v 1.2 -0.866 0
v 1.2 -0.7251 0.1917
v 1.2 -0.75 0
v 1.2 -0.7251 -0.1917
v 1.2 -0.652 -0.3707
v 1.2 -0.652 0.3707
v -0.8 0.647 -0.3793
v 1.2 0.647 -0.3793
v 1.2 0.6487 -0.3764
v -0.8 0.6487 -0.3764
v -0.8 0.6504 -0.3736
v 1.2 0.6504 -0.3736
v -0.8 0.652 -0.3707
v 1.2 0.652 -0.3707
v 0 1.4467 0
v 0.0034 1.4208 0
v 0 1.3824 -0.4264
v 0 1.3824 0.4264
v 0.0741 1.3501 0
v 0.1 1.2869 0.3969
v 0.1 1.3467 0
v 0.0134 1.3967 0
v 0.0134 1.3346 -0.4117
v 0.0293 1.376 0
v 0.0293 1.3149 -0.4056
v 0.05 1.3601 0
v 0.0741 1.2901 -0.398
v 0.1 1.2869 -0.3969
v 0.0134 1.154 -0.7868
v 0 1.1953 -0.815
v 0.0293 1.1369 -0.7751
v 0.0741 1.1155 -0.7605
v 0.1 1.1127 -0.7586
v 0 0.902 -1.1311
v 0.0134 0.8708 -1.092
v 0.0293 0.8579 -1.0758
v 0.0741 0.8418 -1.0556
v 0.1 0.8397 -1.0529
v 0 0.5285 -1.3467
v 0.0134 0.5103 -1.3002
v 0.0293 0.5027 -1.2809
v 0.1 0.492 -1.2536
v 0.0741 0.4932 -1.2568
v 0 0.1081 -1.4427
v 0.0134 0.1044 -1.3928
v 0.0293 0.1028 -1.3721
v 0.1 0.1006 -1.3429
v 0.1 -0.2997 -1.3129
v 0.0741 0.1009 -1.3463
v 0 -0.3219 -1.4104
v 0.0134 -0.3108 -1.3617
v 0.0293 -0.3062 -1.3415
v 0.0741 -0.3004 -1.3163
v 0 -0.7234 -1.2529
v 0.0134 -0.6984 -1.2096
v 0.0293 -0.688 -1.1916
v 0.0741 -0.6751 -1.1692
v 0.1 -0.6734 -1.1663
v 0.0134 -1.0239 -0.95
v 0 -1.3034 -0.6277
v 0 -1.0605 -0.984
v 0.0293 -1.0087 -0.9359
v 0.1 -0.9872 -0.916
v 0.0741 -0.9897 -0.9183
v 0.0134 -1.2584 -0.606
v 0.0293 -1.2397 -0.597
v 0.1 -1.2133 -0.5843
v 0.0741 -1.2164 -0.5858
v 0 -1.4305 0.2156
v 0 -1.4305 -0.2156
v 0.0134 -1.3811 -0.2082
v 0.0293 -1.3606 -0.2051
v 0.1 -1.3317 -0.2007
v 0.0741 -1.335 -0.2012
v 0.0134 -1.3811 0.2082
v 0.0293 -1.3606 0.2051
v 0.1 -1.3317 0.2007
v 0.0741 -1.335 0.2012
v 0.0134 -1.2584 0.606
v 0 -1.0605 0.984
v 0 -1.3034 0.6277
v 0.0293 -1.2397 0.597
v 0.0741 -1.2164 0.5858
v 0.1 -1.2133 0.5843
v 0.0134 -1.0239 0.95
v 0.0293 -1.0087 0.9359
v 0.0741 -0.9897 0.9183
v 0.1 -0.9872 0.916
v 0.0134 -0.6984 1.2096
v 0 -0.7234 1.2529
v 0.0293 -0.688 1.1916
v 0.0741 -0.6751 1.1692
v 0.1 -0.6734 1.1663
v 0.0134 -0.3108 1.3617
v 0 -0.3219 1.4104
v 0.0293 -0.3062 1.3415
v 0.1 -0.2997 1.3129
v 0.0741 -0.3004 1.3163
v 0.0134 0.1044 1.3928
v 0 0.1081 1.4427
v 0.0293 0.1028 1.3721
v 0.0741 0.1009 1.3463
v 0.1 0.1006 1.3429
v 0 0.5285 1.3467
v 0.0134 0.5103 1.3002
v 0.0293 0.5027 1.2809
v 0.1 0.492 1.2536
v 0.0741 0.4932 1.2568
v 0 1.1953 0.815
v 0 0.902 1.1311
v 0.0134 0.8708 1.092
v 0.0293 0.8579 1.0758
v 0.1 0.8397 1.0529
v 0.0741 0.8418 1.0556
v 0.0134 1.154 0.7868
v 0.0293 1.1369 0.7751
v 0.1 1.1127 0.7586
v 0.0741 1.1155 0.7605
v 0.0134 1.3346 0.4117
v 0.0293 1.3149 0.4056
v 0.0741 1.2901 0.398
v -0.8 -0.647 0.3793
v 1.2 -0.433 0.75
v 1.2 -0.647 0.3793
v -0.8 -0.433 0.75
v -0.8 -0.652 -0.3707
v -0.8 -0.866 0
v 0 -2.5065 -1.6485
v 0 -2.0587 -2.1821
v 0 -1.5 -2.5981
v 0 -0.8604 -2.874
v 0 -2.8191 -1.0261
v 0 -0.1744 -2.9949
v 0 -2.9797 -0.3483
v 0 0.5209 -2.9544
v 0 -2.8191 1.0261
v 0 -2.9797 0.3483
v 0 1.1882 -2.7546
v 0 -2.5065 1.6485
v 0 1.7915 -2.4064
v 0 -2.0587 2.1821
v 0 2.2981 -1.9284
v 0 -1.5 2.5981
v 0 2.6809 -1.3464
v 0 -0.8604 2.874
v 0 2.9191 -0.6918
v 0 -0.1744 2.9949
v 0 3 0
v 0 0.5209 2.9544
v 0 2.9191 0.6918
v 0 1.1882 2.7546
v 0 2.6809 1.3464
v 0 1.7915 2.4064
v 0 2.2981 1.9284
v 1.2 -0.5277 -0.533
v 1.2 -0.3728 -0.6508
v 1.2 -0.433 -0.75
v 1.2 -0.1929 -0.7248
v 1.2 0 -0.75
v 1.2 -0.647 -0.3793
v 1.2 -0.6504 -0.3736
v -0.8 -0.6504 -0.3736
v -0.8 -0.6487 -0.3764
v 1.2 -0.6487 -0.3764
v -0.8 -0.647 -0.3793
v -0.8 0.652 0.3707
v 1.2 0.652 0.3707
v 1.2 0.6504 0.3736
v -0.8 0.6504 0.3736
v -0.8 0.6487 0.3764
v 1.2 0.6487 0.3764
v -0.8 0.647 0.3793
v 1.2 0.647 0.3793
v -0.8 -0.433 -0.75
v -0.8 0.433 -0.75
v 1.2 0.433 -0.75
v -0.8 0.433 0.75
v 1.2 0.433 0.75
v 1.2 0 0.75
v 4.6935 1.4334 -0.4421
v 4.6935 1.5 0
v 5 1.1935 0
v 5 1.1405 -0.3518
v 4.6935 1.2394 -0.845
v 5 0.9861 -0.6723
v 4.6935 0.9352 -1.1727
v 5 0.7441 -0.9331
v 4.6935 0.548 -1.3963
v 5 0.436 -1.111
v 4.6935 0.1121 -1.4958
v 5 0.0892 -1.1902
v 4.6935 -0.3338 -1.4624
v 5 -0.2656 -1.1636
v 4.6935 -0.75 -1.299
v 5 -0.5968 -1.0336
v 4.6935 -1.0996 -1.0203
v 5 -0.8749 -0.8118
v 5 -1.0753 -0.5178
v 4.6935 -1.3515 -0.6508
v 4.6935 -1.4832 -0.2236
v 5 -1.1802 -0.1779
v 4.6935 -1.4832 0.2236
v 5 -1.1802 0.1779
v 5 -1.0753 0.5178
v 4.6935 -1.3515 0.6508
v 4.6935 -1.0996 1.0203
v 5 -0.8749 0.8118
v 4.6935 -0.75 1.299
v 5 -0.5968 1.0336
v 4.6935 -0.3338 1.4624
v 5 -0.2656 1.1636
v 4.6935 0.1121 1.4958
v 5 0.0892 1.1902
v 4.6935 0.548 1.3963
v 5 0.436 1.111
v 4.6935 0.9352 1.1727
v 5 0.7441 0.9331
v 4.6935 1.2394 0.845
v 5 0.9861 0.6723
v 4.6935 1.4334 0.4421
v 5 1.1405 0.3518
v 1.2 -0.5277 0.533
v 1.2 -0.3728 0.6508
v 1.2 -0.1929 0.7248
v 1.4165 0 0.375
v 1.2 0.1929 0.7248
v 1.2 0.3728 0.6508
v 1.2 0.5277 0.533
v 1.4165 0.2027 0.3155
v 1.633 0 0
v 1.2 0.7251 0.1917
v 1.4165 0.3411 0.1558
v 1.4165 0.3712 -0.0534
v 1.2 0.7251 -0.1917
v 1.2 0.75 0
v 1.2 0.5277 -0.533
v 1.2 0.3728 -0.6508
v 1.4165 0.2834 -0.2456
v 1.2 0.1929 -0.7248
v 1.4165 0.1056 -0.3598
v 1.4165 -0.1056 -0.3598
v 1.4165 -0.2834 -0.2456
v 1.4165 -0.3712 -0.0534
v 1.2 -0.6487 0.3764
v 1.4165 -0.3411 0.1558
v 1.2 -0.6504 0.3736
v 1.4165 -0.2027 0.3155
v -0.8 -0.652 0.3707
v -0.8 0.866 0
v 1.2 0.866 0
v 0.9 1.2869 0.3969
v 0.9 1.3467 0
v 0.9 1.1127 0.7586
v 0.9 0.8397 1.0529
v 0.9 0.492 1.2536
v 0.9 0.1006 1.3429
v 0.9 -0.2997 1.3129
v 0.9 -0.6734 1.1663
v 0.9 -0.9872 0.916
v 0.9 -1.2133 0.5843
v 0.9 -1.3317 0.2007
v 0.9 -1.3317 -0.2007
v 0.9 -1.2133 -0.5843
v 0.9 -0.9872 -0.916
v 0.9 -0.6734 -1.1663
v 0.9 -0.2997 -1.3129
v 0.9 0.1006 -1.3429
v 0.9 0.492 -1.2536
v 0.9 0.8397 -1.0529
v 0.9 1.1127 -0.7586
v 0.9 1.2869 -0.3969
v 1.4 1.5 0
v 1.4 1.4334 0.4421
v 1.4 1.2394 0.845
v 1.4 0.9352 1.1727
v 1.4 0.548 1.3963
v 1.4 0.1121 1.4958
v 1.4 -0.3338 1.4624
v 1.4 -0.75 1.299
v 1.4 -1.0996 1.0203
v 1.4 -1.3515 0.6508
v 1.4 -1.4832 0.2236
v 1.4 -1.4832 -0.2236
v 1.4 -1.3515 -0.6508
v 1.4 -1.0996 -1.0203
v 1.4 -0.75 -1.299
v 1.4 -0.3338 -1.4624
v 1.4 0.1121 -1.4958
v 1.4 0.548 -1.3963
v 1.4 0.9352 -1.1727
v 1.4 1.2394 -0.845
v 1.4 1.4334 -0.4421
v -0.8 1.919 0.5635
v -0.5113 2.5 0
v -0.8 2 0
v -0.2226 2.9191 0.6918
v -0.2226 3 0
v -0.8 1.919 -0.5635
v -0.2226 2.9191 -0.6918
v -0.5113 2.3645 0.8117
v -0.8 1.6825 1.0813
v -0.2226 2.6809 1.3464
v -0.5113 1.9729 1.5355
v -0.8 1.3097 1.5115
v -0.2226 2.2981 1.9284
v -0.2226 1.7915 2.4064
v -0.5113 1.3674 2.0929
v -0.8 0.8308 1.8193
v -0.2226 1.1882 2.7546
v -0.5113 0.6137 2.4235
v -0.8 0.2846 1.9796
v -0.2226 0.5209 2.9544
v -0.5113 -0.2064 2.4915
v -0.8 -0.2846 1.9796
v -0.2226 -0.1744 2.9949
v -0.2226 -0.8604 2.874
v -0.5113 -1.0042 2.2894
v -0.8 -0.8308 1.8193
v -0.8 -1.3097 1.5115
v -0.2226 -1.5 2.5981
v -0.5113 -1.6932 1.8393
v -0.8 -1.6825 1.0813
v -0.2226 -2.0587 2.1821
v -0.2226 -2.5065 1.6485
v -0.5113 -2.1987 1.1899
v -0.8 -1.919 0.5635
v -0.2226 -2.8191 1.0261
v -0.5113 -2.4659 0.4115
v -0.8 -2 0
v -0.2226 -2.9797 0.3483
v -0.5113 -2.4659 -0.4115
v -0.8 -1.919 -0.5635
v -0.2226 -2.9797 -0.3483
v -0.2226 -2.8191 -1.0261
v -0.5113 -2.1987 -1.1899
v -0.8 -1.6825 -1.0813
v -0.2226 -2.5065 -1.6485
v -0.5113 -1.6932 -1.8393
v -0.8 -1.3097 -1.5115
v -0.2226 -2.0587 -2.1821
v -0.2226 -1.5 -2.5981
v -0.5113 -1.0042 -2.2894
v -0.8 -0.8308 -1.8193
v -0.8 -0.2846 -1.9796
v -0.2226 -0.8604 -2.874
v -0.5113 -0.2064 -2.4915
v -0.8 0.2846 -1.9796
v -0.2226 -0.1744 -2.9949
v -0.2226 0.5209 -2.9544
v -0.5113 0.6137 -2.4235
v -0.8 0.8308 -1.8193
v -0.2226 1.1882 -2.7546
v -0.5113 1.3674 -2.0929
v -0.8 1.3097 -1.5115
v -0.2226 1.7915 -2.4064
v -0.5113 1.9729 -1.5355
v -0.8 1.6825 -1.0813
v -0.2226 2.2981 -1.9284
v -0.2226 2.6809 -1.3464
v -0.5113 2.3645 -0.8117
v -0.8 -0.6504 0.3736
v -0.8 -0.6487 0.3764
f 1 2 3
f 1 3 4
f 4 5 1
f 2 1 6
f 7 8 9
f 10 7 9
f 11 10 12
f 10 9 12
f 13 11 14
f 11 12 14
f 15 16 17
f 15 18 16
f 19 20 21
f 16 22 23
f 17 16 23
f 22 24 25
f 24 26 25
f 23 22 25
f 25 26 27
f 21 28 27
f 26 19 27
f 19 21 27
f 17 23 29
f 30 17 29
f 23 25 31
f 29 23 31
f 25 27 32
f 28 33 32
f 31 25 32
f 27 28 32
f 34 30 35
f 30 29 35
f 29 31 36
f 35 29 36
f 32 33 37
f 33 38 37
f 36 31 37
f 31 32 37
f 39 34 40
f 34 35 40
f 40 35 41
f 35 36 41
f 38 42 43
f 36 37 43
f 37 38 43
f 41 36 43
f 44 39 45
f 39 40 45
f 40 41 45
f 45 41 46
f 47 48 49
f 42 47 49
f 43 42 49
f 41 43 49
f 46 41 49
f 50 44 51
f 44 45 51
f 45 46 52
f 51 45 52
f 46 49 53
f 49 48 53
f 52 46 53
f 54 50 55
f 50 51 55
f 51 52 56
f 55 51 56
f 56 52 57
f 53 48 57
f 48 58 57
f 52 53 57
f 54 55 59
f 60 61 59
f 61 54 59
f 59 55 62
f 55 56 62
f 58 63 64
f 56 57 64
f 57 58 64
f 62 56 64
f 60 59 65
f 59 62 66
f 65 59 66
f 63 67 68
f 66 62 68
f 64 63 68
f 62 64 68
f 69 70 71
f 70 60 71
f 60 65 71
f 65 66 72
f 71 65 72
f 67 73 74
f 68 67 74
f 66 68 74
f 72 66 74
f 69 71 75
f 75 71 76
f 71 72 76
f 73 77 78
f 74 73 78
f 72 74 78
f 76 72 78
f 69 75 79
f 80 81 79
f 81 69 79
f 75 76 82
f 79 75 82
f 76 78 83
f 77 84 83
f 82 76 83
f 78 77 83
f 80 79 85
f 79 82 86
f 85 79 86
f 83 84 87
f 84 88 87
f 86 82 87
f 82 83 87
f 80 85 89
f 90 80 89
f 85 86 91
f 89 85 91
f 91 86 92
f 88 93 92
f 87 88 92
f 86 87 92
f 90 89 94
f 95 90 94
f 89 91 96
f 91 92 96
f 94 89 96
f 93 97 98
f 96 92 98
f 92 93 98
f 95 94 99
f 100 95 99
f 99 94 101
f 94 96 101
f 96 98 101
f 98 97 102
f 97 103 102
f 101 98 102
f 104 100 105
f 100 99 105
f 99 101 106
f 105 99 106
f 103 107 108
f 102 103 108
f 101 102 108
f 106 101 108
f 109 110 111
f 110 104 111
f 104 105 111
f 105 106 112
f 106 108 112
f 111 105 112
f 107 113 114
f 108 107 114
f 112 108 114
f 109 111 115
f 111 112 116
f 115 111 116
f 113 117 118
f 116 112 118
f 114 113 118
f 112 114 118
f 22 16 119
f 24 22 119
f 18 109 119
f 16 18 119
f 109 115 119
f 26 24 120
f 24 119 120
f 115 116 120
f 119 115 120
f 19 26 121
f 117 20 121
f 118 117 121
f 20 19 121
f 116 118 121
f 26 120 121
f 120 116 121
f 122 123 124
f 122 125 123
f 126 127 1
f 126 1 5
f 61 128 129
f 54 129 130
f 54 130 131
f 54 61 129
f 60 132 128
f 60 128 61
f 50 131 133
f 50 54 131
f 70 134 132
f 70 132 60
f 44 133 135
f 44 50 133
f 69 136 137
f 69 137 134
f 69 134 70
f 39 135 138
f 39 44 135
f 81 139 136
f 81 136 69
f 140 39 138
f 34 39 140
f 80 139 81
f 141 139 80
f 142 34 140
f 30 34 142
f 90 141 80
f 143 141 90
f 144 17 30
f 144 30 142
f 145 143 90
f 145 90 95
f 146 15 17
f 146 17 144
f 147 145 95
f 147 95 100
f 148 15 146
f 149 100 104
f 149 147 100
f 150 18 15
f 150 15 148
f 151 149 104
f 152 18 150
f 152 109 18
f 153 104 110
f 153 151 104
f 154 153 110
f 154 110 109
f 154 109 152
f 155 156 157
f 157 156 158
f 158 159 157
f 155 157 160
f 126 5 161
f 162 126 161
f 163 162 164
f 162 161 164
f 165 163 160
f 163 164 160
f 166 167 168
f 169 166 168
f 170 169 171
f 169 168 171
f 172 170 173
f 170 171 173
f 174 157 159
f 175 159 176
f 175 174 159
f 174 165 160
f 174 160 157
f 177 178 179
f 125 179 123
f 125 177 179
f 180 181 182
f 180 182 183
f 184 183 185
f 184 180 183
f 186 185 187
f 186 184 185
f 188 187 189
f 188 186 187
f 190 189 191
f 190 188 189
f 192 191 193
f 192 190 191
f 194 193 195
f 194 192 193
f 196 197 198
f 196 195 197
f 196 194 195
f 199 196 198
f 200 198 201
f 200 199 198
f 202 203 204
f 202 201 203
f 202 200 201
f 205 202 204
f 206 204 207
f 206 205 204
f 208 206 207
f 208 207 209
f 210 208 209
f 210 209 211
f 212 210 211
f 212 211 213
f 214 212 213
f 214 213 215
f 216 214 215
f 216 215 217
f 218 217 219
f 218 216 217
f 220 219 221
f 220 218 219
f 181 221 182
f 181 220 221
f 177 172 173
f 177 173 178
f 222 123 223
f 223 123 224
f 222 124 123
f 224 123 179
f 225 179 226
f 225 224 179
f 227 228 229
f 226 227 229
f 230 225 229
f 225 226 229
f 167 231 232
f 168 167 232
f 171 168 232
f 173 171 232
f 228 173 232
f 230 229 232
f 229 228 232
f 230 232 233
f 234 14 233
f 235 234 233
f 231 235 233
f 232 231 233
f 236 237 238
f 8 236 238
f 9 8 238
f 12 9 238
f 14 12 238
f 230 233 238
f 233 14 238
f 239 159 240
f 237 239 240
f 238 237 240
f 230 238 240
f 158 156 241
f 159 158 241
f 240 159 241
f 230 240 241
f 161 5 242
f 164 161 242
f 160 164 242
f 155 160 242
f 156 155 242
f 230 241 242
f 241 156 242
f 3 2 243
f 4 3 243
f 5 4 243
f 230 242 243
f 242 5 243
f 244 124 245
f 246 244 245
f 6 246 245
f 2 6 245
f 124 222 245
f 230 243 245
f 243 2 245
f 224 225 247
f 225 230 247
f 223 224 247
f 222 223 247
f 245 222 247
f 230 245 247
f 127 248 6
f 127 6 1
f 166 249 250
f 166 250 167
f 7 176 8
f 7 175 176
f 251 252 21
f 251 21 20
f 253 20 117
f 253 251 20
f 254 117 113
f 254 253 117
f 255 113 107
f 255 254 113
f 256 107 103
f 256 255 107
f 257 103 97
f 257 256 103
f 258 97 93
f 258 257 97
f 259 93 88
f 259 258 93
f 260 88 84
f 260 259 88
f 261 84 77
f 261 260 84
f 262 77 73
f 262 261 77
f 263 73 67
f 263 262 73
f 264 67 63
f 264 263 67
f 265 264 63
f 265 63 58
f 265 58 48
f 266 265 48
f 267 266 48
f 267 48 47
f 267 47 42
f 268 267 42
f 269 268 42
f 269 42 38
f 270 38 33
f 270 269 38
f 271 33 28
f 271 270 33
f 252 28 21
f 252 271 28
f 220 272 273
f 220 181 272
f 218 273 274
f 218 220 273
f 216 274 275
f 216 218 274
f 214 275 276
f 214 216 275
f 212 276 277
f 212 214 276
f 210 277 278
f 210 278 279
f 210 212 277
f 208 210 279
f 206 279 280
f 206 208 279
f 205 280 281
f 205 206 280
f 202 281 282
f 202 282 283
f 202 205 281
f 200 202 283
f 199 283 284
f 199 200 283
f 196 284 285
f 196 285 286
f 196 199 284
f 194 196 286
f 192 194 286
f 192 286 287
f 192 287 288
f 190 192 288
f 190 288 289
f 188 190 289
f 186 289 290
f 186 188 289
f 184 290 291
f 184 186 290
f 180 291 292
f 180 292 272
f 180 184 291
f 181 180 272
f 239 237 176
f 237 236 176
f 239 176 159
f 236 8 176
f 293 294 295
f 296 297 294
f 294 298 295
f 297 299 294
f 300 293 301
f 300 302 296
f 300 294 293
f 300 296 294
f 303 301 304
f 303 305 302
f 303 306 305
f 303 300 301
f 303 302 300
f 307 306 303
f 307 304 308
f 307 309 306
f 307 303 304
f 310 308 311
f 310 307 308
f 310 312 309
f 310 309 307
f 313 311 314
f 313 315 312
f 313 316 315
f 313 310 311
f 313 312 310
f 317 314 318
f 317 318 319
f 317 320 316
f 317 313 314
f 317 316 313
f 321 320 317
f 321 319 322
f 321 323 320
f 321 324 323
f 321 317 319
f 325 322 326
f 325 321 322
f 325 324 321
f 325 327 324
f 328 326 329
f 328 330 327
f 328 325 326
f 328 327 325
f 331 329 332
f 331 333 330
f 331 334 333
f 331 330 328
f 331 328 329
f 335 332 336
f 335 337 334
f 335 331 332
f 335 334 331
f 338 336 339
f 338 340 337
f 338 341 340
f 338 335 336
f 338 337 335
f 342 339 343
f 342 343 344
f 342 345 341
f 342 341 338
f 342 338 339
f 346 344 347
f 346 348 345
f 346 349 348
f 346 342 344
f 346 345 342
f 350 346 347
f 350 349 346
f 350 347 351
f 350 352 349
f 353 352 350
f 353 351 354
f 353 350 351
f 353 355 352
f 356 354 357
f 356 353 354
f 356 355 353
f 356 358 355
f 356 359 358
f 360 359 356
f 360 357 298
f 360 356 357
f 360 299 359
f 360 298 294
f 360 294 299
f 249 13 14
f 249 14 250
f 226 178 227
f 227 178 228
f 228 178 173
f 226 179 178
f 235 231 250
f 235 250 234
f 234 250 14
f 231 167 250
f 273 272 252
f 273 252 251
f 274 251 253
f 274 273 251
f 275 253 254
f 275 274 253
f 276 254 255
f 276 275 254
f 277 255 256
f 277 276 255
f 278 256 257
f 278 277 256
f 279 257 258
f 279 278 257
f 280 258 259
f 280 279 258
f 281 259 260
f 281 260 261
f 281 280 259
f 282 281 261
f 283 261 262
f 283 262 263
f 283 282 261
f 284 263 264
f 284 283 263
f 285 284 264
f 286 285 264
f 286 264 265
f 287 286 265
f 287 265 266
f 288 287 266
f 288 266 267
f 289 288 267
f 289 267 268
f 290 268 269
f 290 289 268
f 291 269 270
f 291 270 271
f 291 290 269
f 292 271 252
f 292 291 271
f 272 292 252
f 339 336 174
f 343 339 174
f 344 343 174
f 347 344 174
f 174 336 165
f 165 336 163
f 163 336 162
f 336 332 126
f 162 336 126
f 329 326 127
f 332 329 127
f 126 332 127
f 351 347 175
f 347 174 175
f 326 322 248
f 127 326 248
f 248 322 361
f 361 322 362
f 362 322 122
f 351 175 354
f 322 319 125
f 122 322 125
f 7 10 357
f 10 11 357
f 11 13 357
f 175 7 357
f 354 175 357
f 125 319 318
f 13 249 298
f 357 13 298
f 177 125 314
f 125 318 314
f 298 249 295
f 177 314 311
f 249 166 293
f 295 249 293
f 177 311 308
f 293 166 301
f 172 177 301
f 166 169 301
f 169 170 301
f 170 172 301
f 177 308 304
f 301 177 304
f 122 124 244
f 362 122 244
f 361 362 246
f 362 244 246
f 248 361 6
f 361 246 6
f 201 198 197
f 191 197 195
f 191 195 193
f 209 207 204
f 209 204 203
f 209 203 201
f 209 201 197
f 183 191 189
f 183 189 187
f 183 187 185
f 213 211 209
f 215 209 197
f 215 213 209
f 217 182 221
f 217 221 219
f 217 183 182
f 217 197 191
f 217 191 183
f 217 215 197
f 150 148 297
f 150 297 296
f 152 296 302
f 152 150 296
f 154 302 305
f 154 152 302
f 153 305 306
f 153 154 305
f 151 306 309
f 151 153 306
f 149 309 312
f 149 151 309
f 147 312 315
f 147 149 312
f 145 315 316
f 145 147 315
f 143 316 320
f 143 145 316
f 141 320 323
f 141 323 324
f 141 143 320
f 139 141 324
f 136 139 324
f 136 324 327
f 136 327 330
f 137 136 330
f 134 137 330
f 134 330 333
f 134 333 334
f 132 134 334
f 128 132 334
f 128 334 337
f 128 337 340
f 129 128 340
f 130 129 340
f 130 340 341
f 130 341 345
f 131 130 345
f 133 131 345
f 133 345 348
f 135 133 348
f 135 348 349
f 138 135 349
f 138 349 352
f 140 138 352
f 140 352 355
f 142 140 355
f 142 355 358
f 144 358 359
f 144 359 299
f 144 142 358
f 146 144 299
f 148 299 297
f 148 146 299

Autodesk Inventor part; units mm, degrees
ref_plane "YZ Plane" through (0, 0, 0) normal (1, 0, 0) x (0, 1, 0)
ref_plane "XZ Plane" through (0, 0, 0) normal (0, 1, 0) x (-1, 0, 0)
ref_plane "XY Plane" through (0, 0, 0) normal (0, 0, 1) x (1, 0, 0)
sketch "Sketch_1" plane through (0, 0, 0) normal (0, 0, 1) x (1, 0, 0)
  line L0 (5, 0) -> (-0.8, 0)
  line L1 (-0.8, 0) -> (-0.8, 2)
  line L2 (-0.8, 2) -> (-0.2226, 3)
  line L3 (-0.2226, 3) -> (0, 3)
  line L4 (0, 3) -> (0, 1.4467)
  arc A0 (0, 1.4467) -> (0.1, 1.3467) centre (0.1, 1.4467) ccw
  line L5 (0.1, 1.3467) -> (0.9, 1.3467)
  line L6 (0.9, 1.3467) -> (1.4, 1.5)
  line L7 (1.4, 1.5) -> (4.6935, 1.5)
  line L8 (4.6935, 1.5) -> (5, 1.1935)
  line L9 (5, 1.1935) -> (5, 0)
  line L10 (5, 0) -> (-0.8, 0)
revolve "Revolution1" add sketch "Sketch_1" angle 360 about axis through (5, 0, 0) along (1, 0, 0)
thread "Thread1" size "M3x0.5" class "6g" standard "ISO Metric profile" full length
sketch "Sketch2" plane through (-0.8, 0, 0) normal (-1, 0, 0) x (0, 0, 1)
  point P0 (0, 0)
hole "Hole1" at (-0.8, 0, 0) direction (1, 0, 0) diameter 1.5 depth 2 tip angle 120
sketch "Sketch_3" plane through (-0.8, 0, 0) normal (1, 0, 0) x (0, 0, -1)
  line L0 (-0.75, -0.433) -> (0, -0.866)
  line L1 (0, -0.866) -> (0.75, -0.433)
  line L2 (0.75, -0.433) -> (0.75, 0.433)
  line L3 (0.75, 0.433) -> (0, 0.866)
  line L4 (0, 0.866) -> (-0.75, 0.433)
  line L5 (-0.75, 0.433) -> (-0.75, -0.433)
extrude "Extrusion1" cut sketch "Sketch_3" along normal blind 2
properties part number "CBSTSR3-5"
